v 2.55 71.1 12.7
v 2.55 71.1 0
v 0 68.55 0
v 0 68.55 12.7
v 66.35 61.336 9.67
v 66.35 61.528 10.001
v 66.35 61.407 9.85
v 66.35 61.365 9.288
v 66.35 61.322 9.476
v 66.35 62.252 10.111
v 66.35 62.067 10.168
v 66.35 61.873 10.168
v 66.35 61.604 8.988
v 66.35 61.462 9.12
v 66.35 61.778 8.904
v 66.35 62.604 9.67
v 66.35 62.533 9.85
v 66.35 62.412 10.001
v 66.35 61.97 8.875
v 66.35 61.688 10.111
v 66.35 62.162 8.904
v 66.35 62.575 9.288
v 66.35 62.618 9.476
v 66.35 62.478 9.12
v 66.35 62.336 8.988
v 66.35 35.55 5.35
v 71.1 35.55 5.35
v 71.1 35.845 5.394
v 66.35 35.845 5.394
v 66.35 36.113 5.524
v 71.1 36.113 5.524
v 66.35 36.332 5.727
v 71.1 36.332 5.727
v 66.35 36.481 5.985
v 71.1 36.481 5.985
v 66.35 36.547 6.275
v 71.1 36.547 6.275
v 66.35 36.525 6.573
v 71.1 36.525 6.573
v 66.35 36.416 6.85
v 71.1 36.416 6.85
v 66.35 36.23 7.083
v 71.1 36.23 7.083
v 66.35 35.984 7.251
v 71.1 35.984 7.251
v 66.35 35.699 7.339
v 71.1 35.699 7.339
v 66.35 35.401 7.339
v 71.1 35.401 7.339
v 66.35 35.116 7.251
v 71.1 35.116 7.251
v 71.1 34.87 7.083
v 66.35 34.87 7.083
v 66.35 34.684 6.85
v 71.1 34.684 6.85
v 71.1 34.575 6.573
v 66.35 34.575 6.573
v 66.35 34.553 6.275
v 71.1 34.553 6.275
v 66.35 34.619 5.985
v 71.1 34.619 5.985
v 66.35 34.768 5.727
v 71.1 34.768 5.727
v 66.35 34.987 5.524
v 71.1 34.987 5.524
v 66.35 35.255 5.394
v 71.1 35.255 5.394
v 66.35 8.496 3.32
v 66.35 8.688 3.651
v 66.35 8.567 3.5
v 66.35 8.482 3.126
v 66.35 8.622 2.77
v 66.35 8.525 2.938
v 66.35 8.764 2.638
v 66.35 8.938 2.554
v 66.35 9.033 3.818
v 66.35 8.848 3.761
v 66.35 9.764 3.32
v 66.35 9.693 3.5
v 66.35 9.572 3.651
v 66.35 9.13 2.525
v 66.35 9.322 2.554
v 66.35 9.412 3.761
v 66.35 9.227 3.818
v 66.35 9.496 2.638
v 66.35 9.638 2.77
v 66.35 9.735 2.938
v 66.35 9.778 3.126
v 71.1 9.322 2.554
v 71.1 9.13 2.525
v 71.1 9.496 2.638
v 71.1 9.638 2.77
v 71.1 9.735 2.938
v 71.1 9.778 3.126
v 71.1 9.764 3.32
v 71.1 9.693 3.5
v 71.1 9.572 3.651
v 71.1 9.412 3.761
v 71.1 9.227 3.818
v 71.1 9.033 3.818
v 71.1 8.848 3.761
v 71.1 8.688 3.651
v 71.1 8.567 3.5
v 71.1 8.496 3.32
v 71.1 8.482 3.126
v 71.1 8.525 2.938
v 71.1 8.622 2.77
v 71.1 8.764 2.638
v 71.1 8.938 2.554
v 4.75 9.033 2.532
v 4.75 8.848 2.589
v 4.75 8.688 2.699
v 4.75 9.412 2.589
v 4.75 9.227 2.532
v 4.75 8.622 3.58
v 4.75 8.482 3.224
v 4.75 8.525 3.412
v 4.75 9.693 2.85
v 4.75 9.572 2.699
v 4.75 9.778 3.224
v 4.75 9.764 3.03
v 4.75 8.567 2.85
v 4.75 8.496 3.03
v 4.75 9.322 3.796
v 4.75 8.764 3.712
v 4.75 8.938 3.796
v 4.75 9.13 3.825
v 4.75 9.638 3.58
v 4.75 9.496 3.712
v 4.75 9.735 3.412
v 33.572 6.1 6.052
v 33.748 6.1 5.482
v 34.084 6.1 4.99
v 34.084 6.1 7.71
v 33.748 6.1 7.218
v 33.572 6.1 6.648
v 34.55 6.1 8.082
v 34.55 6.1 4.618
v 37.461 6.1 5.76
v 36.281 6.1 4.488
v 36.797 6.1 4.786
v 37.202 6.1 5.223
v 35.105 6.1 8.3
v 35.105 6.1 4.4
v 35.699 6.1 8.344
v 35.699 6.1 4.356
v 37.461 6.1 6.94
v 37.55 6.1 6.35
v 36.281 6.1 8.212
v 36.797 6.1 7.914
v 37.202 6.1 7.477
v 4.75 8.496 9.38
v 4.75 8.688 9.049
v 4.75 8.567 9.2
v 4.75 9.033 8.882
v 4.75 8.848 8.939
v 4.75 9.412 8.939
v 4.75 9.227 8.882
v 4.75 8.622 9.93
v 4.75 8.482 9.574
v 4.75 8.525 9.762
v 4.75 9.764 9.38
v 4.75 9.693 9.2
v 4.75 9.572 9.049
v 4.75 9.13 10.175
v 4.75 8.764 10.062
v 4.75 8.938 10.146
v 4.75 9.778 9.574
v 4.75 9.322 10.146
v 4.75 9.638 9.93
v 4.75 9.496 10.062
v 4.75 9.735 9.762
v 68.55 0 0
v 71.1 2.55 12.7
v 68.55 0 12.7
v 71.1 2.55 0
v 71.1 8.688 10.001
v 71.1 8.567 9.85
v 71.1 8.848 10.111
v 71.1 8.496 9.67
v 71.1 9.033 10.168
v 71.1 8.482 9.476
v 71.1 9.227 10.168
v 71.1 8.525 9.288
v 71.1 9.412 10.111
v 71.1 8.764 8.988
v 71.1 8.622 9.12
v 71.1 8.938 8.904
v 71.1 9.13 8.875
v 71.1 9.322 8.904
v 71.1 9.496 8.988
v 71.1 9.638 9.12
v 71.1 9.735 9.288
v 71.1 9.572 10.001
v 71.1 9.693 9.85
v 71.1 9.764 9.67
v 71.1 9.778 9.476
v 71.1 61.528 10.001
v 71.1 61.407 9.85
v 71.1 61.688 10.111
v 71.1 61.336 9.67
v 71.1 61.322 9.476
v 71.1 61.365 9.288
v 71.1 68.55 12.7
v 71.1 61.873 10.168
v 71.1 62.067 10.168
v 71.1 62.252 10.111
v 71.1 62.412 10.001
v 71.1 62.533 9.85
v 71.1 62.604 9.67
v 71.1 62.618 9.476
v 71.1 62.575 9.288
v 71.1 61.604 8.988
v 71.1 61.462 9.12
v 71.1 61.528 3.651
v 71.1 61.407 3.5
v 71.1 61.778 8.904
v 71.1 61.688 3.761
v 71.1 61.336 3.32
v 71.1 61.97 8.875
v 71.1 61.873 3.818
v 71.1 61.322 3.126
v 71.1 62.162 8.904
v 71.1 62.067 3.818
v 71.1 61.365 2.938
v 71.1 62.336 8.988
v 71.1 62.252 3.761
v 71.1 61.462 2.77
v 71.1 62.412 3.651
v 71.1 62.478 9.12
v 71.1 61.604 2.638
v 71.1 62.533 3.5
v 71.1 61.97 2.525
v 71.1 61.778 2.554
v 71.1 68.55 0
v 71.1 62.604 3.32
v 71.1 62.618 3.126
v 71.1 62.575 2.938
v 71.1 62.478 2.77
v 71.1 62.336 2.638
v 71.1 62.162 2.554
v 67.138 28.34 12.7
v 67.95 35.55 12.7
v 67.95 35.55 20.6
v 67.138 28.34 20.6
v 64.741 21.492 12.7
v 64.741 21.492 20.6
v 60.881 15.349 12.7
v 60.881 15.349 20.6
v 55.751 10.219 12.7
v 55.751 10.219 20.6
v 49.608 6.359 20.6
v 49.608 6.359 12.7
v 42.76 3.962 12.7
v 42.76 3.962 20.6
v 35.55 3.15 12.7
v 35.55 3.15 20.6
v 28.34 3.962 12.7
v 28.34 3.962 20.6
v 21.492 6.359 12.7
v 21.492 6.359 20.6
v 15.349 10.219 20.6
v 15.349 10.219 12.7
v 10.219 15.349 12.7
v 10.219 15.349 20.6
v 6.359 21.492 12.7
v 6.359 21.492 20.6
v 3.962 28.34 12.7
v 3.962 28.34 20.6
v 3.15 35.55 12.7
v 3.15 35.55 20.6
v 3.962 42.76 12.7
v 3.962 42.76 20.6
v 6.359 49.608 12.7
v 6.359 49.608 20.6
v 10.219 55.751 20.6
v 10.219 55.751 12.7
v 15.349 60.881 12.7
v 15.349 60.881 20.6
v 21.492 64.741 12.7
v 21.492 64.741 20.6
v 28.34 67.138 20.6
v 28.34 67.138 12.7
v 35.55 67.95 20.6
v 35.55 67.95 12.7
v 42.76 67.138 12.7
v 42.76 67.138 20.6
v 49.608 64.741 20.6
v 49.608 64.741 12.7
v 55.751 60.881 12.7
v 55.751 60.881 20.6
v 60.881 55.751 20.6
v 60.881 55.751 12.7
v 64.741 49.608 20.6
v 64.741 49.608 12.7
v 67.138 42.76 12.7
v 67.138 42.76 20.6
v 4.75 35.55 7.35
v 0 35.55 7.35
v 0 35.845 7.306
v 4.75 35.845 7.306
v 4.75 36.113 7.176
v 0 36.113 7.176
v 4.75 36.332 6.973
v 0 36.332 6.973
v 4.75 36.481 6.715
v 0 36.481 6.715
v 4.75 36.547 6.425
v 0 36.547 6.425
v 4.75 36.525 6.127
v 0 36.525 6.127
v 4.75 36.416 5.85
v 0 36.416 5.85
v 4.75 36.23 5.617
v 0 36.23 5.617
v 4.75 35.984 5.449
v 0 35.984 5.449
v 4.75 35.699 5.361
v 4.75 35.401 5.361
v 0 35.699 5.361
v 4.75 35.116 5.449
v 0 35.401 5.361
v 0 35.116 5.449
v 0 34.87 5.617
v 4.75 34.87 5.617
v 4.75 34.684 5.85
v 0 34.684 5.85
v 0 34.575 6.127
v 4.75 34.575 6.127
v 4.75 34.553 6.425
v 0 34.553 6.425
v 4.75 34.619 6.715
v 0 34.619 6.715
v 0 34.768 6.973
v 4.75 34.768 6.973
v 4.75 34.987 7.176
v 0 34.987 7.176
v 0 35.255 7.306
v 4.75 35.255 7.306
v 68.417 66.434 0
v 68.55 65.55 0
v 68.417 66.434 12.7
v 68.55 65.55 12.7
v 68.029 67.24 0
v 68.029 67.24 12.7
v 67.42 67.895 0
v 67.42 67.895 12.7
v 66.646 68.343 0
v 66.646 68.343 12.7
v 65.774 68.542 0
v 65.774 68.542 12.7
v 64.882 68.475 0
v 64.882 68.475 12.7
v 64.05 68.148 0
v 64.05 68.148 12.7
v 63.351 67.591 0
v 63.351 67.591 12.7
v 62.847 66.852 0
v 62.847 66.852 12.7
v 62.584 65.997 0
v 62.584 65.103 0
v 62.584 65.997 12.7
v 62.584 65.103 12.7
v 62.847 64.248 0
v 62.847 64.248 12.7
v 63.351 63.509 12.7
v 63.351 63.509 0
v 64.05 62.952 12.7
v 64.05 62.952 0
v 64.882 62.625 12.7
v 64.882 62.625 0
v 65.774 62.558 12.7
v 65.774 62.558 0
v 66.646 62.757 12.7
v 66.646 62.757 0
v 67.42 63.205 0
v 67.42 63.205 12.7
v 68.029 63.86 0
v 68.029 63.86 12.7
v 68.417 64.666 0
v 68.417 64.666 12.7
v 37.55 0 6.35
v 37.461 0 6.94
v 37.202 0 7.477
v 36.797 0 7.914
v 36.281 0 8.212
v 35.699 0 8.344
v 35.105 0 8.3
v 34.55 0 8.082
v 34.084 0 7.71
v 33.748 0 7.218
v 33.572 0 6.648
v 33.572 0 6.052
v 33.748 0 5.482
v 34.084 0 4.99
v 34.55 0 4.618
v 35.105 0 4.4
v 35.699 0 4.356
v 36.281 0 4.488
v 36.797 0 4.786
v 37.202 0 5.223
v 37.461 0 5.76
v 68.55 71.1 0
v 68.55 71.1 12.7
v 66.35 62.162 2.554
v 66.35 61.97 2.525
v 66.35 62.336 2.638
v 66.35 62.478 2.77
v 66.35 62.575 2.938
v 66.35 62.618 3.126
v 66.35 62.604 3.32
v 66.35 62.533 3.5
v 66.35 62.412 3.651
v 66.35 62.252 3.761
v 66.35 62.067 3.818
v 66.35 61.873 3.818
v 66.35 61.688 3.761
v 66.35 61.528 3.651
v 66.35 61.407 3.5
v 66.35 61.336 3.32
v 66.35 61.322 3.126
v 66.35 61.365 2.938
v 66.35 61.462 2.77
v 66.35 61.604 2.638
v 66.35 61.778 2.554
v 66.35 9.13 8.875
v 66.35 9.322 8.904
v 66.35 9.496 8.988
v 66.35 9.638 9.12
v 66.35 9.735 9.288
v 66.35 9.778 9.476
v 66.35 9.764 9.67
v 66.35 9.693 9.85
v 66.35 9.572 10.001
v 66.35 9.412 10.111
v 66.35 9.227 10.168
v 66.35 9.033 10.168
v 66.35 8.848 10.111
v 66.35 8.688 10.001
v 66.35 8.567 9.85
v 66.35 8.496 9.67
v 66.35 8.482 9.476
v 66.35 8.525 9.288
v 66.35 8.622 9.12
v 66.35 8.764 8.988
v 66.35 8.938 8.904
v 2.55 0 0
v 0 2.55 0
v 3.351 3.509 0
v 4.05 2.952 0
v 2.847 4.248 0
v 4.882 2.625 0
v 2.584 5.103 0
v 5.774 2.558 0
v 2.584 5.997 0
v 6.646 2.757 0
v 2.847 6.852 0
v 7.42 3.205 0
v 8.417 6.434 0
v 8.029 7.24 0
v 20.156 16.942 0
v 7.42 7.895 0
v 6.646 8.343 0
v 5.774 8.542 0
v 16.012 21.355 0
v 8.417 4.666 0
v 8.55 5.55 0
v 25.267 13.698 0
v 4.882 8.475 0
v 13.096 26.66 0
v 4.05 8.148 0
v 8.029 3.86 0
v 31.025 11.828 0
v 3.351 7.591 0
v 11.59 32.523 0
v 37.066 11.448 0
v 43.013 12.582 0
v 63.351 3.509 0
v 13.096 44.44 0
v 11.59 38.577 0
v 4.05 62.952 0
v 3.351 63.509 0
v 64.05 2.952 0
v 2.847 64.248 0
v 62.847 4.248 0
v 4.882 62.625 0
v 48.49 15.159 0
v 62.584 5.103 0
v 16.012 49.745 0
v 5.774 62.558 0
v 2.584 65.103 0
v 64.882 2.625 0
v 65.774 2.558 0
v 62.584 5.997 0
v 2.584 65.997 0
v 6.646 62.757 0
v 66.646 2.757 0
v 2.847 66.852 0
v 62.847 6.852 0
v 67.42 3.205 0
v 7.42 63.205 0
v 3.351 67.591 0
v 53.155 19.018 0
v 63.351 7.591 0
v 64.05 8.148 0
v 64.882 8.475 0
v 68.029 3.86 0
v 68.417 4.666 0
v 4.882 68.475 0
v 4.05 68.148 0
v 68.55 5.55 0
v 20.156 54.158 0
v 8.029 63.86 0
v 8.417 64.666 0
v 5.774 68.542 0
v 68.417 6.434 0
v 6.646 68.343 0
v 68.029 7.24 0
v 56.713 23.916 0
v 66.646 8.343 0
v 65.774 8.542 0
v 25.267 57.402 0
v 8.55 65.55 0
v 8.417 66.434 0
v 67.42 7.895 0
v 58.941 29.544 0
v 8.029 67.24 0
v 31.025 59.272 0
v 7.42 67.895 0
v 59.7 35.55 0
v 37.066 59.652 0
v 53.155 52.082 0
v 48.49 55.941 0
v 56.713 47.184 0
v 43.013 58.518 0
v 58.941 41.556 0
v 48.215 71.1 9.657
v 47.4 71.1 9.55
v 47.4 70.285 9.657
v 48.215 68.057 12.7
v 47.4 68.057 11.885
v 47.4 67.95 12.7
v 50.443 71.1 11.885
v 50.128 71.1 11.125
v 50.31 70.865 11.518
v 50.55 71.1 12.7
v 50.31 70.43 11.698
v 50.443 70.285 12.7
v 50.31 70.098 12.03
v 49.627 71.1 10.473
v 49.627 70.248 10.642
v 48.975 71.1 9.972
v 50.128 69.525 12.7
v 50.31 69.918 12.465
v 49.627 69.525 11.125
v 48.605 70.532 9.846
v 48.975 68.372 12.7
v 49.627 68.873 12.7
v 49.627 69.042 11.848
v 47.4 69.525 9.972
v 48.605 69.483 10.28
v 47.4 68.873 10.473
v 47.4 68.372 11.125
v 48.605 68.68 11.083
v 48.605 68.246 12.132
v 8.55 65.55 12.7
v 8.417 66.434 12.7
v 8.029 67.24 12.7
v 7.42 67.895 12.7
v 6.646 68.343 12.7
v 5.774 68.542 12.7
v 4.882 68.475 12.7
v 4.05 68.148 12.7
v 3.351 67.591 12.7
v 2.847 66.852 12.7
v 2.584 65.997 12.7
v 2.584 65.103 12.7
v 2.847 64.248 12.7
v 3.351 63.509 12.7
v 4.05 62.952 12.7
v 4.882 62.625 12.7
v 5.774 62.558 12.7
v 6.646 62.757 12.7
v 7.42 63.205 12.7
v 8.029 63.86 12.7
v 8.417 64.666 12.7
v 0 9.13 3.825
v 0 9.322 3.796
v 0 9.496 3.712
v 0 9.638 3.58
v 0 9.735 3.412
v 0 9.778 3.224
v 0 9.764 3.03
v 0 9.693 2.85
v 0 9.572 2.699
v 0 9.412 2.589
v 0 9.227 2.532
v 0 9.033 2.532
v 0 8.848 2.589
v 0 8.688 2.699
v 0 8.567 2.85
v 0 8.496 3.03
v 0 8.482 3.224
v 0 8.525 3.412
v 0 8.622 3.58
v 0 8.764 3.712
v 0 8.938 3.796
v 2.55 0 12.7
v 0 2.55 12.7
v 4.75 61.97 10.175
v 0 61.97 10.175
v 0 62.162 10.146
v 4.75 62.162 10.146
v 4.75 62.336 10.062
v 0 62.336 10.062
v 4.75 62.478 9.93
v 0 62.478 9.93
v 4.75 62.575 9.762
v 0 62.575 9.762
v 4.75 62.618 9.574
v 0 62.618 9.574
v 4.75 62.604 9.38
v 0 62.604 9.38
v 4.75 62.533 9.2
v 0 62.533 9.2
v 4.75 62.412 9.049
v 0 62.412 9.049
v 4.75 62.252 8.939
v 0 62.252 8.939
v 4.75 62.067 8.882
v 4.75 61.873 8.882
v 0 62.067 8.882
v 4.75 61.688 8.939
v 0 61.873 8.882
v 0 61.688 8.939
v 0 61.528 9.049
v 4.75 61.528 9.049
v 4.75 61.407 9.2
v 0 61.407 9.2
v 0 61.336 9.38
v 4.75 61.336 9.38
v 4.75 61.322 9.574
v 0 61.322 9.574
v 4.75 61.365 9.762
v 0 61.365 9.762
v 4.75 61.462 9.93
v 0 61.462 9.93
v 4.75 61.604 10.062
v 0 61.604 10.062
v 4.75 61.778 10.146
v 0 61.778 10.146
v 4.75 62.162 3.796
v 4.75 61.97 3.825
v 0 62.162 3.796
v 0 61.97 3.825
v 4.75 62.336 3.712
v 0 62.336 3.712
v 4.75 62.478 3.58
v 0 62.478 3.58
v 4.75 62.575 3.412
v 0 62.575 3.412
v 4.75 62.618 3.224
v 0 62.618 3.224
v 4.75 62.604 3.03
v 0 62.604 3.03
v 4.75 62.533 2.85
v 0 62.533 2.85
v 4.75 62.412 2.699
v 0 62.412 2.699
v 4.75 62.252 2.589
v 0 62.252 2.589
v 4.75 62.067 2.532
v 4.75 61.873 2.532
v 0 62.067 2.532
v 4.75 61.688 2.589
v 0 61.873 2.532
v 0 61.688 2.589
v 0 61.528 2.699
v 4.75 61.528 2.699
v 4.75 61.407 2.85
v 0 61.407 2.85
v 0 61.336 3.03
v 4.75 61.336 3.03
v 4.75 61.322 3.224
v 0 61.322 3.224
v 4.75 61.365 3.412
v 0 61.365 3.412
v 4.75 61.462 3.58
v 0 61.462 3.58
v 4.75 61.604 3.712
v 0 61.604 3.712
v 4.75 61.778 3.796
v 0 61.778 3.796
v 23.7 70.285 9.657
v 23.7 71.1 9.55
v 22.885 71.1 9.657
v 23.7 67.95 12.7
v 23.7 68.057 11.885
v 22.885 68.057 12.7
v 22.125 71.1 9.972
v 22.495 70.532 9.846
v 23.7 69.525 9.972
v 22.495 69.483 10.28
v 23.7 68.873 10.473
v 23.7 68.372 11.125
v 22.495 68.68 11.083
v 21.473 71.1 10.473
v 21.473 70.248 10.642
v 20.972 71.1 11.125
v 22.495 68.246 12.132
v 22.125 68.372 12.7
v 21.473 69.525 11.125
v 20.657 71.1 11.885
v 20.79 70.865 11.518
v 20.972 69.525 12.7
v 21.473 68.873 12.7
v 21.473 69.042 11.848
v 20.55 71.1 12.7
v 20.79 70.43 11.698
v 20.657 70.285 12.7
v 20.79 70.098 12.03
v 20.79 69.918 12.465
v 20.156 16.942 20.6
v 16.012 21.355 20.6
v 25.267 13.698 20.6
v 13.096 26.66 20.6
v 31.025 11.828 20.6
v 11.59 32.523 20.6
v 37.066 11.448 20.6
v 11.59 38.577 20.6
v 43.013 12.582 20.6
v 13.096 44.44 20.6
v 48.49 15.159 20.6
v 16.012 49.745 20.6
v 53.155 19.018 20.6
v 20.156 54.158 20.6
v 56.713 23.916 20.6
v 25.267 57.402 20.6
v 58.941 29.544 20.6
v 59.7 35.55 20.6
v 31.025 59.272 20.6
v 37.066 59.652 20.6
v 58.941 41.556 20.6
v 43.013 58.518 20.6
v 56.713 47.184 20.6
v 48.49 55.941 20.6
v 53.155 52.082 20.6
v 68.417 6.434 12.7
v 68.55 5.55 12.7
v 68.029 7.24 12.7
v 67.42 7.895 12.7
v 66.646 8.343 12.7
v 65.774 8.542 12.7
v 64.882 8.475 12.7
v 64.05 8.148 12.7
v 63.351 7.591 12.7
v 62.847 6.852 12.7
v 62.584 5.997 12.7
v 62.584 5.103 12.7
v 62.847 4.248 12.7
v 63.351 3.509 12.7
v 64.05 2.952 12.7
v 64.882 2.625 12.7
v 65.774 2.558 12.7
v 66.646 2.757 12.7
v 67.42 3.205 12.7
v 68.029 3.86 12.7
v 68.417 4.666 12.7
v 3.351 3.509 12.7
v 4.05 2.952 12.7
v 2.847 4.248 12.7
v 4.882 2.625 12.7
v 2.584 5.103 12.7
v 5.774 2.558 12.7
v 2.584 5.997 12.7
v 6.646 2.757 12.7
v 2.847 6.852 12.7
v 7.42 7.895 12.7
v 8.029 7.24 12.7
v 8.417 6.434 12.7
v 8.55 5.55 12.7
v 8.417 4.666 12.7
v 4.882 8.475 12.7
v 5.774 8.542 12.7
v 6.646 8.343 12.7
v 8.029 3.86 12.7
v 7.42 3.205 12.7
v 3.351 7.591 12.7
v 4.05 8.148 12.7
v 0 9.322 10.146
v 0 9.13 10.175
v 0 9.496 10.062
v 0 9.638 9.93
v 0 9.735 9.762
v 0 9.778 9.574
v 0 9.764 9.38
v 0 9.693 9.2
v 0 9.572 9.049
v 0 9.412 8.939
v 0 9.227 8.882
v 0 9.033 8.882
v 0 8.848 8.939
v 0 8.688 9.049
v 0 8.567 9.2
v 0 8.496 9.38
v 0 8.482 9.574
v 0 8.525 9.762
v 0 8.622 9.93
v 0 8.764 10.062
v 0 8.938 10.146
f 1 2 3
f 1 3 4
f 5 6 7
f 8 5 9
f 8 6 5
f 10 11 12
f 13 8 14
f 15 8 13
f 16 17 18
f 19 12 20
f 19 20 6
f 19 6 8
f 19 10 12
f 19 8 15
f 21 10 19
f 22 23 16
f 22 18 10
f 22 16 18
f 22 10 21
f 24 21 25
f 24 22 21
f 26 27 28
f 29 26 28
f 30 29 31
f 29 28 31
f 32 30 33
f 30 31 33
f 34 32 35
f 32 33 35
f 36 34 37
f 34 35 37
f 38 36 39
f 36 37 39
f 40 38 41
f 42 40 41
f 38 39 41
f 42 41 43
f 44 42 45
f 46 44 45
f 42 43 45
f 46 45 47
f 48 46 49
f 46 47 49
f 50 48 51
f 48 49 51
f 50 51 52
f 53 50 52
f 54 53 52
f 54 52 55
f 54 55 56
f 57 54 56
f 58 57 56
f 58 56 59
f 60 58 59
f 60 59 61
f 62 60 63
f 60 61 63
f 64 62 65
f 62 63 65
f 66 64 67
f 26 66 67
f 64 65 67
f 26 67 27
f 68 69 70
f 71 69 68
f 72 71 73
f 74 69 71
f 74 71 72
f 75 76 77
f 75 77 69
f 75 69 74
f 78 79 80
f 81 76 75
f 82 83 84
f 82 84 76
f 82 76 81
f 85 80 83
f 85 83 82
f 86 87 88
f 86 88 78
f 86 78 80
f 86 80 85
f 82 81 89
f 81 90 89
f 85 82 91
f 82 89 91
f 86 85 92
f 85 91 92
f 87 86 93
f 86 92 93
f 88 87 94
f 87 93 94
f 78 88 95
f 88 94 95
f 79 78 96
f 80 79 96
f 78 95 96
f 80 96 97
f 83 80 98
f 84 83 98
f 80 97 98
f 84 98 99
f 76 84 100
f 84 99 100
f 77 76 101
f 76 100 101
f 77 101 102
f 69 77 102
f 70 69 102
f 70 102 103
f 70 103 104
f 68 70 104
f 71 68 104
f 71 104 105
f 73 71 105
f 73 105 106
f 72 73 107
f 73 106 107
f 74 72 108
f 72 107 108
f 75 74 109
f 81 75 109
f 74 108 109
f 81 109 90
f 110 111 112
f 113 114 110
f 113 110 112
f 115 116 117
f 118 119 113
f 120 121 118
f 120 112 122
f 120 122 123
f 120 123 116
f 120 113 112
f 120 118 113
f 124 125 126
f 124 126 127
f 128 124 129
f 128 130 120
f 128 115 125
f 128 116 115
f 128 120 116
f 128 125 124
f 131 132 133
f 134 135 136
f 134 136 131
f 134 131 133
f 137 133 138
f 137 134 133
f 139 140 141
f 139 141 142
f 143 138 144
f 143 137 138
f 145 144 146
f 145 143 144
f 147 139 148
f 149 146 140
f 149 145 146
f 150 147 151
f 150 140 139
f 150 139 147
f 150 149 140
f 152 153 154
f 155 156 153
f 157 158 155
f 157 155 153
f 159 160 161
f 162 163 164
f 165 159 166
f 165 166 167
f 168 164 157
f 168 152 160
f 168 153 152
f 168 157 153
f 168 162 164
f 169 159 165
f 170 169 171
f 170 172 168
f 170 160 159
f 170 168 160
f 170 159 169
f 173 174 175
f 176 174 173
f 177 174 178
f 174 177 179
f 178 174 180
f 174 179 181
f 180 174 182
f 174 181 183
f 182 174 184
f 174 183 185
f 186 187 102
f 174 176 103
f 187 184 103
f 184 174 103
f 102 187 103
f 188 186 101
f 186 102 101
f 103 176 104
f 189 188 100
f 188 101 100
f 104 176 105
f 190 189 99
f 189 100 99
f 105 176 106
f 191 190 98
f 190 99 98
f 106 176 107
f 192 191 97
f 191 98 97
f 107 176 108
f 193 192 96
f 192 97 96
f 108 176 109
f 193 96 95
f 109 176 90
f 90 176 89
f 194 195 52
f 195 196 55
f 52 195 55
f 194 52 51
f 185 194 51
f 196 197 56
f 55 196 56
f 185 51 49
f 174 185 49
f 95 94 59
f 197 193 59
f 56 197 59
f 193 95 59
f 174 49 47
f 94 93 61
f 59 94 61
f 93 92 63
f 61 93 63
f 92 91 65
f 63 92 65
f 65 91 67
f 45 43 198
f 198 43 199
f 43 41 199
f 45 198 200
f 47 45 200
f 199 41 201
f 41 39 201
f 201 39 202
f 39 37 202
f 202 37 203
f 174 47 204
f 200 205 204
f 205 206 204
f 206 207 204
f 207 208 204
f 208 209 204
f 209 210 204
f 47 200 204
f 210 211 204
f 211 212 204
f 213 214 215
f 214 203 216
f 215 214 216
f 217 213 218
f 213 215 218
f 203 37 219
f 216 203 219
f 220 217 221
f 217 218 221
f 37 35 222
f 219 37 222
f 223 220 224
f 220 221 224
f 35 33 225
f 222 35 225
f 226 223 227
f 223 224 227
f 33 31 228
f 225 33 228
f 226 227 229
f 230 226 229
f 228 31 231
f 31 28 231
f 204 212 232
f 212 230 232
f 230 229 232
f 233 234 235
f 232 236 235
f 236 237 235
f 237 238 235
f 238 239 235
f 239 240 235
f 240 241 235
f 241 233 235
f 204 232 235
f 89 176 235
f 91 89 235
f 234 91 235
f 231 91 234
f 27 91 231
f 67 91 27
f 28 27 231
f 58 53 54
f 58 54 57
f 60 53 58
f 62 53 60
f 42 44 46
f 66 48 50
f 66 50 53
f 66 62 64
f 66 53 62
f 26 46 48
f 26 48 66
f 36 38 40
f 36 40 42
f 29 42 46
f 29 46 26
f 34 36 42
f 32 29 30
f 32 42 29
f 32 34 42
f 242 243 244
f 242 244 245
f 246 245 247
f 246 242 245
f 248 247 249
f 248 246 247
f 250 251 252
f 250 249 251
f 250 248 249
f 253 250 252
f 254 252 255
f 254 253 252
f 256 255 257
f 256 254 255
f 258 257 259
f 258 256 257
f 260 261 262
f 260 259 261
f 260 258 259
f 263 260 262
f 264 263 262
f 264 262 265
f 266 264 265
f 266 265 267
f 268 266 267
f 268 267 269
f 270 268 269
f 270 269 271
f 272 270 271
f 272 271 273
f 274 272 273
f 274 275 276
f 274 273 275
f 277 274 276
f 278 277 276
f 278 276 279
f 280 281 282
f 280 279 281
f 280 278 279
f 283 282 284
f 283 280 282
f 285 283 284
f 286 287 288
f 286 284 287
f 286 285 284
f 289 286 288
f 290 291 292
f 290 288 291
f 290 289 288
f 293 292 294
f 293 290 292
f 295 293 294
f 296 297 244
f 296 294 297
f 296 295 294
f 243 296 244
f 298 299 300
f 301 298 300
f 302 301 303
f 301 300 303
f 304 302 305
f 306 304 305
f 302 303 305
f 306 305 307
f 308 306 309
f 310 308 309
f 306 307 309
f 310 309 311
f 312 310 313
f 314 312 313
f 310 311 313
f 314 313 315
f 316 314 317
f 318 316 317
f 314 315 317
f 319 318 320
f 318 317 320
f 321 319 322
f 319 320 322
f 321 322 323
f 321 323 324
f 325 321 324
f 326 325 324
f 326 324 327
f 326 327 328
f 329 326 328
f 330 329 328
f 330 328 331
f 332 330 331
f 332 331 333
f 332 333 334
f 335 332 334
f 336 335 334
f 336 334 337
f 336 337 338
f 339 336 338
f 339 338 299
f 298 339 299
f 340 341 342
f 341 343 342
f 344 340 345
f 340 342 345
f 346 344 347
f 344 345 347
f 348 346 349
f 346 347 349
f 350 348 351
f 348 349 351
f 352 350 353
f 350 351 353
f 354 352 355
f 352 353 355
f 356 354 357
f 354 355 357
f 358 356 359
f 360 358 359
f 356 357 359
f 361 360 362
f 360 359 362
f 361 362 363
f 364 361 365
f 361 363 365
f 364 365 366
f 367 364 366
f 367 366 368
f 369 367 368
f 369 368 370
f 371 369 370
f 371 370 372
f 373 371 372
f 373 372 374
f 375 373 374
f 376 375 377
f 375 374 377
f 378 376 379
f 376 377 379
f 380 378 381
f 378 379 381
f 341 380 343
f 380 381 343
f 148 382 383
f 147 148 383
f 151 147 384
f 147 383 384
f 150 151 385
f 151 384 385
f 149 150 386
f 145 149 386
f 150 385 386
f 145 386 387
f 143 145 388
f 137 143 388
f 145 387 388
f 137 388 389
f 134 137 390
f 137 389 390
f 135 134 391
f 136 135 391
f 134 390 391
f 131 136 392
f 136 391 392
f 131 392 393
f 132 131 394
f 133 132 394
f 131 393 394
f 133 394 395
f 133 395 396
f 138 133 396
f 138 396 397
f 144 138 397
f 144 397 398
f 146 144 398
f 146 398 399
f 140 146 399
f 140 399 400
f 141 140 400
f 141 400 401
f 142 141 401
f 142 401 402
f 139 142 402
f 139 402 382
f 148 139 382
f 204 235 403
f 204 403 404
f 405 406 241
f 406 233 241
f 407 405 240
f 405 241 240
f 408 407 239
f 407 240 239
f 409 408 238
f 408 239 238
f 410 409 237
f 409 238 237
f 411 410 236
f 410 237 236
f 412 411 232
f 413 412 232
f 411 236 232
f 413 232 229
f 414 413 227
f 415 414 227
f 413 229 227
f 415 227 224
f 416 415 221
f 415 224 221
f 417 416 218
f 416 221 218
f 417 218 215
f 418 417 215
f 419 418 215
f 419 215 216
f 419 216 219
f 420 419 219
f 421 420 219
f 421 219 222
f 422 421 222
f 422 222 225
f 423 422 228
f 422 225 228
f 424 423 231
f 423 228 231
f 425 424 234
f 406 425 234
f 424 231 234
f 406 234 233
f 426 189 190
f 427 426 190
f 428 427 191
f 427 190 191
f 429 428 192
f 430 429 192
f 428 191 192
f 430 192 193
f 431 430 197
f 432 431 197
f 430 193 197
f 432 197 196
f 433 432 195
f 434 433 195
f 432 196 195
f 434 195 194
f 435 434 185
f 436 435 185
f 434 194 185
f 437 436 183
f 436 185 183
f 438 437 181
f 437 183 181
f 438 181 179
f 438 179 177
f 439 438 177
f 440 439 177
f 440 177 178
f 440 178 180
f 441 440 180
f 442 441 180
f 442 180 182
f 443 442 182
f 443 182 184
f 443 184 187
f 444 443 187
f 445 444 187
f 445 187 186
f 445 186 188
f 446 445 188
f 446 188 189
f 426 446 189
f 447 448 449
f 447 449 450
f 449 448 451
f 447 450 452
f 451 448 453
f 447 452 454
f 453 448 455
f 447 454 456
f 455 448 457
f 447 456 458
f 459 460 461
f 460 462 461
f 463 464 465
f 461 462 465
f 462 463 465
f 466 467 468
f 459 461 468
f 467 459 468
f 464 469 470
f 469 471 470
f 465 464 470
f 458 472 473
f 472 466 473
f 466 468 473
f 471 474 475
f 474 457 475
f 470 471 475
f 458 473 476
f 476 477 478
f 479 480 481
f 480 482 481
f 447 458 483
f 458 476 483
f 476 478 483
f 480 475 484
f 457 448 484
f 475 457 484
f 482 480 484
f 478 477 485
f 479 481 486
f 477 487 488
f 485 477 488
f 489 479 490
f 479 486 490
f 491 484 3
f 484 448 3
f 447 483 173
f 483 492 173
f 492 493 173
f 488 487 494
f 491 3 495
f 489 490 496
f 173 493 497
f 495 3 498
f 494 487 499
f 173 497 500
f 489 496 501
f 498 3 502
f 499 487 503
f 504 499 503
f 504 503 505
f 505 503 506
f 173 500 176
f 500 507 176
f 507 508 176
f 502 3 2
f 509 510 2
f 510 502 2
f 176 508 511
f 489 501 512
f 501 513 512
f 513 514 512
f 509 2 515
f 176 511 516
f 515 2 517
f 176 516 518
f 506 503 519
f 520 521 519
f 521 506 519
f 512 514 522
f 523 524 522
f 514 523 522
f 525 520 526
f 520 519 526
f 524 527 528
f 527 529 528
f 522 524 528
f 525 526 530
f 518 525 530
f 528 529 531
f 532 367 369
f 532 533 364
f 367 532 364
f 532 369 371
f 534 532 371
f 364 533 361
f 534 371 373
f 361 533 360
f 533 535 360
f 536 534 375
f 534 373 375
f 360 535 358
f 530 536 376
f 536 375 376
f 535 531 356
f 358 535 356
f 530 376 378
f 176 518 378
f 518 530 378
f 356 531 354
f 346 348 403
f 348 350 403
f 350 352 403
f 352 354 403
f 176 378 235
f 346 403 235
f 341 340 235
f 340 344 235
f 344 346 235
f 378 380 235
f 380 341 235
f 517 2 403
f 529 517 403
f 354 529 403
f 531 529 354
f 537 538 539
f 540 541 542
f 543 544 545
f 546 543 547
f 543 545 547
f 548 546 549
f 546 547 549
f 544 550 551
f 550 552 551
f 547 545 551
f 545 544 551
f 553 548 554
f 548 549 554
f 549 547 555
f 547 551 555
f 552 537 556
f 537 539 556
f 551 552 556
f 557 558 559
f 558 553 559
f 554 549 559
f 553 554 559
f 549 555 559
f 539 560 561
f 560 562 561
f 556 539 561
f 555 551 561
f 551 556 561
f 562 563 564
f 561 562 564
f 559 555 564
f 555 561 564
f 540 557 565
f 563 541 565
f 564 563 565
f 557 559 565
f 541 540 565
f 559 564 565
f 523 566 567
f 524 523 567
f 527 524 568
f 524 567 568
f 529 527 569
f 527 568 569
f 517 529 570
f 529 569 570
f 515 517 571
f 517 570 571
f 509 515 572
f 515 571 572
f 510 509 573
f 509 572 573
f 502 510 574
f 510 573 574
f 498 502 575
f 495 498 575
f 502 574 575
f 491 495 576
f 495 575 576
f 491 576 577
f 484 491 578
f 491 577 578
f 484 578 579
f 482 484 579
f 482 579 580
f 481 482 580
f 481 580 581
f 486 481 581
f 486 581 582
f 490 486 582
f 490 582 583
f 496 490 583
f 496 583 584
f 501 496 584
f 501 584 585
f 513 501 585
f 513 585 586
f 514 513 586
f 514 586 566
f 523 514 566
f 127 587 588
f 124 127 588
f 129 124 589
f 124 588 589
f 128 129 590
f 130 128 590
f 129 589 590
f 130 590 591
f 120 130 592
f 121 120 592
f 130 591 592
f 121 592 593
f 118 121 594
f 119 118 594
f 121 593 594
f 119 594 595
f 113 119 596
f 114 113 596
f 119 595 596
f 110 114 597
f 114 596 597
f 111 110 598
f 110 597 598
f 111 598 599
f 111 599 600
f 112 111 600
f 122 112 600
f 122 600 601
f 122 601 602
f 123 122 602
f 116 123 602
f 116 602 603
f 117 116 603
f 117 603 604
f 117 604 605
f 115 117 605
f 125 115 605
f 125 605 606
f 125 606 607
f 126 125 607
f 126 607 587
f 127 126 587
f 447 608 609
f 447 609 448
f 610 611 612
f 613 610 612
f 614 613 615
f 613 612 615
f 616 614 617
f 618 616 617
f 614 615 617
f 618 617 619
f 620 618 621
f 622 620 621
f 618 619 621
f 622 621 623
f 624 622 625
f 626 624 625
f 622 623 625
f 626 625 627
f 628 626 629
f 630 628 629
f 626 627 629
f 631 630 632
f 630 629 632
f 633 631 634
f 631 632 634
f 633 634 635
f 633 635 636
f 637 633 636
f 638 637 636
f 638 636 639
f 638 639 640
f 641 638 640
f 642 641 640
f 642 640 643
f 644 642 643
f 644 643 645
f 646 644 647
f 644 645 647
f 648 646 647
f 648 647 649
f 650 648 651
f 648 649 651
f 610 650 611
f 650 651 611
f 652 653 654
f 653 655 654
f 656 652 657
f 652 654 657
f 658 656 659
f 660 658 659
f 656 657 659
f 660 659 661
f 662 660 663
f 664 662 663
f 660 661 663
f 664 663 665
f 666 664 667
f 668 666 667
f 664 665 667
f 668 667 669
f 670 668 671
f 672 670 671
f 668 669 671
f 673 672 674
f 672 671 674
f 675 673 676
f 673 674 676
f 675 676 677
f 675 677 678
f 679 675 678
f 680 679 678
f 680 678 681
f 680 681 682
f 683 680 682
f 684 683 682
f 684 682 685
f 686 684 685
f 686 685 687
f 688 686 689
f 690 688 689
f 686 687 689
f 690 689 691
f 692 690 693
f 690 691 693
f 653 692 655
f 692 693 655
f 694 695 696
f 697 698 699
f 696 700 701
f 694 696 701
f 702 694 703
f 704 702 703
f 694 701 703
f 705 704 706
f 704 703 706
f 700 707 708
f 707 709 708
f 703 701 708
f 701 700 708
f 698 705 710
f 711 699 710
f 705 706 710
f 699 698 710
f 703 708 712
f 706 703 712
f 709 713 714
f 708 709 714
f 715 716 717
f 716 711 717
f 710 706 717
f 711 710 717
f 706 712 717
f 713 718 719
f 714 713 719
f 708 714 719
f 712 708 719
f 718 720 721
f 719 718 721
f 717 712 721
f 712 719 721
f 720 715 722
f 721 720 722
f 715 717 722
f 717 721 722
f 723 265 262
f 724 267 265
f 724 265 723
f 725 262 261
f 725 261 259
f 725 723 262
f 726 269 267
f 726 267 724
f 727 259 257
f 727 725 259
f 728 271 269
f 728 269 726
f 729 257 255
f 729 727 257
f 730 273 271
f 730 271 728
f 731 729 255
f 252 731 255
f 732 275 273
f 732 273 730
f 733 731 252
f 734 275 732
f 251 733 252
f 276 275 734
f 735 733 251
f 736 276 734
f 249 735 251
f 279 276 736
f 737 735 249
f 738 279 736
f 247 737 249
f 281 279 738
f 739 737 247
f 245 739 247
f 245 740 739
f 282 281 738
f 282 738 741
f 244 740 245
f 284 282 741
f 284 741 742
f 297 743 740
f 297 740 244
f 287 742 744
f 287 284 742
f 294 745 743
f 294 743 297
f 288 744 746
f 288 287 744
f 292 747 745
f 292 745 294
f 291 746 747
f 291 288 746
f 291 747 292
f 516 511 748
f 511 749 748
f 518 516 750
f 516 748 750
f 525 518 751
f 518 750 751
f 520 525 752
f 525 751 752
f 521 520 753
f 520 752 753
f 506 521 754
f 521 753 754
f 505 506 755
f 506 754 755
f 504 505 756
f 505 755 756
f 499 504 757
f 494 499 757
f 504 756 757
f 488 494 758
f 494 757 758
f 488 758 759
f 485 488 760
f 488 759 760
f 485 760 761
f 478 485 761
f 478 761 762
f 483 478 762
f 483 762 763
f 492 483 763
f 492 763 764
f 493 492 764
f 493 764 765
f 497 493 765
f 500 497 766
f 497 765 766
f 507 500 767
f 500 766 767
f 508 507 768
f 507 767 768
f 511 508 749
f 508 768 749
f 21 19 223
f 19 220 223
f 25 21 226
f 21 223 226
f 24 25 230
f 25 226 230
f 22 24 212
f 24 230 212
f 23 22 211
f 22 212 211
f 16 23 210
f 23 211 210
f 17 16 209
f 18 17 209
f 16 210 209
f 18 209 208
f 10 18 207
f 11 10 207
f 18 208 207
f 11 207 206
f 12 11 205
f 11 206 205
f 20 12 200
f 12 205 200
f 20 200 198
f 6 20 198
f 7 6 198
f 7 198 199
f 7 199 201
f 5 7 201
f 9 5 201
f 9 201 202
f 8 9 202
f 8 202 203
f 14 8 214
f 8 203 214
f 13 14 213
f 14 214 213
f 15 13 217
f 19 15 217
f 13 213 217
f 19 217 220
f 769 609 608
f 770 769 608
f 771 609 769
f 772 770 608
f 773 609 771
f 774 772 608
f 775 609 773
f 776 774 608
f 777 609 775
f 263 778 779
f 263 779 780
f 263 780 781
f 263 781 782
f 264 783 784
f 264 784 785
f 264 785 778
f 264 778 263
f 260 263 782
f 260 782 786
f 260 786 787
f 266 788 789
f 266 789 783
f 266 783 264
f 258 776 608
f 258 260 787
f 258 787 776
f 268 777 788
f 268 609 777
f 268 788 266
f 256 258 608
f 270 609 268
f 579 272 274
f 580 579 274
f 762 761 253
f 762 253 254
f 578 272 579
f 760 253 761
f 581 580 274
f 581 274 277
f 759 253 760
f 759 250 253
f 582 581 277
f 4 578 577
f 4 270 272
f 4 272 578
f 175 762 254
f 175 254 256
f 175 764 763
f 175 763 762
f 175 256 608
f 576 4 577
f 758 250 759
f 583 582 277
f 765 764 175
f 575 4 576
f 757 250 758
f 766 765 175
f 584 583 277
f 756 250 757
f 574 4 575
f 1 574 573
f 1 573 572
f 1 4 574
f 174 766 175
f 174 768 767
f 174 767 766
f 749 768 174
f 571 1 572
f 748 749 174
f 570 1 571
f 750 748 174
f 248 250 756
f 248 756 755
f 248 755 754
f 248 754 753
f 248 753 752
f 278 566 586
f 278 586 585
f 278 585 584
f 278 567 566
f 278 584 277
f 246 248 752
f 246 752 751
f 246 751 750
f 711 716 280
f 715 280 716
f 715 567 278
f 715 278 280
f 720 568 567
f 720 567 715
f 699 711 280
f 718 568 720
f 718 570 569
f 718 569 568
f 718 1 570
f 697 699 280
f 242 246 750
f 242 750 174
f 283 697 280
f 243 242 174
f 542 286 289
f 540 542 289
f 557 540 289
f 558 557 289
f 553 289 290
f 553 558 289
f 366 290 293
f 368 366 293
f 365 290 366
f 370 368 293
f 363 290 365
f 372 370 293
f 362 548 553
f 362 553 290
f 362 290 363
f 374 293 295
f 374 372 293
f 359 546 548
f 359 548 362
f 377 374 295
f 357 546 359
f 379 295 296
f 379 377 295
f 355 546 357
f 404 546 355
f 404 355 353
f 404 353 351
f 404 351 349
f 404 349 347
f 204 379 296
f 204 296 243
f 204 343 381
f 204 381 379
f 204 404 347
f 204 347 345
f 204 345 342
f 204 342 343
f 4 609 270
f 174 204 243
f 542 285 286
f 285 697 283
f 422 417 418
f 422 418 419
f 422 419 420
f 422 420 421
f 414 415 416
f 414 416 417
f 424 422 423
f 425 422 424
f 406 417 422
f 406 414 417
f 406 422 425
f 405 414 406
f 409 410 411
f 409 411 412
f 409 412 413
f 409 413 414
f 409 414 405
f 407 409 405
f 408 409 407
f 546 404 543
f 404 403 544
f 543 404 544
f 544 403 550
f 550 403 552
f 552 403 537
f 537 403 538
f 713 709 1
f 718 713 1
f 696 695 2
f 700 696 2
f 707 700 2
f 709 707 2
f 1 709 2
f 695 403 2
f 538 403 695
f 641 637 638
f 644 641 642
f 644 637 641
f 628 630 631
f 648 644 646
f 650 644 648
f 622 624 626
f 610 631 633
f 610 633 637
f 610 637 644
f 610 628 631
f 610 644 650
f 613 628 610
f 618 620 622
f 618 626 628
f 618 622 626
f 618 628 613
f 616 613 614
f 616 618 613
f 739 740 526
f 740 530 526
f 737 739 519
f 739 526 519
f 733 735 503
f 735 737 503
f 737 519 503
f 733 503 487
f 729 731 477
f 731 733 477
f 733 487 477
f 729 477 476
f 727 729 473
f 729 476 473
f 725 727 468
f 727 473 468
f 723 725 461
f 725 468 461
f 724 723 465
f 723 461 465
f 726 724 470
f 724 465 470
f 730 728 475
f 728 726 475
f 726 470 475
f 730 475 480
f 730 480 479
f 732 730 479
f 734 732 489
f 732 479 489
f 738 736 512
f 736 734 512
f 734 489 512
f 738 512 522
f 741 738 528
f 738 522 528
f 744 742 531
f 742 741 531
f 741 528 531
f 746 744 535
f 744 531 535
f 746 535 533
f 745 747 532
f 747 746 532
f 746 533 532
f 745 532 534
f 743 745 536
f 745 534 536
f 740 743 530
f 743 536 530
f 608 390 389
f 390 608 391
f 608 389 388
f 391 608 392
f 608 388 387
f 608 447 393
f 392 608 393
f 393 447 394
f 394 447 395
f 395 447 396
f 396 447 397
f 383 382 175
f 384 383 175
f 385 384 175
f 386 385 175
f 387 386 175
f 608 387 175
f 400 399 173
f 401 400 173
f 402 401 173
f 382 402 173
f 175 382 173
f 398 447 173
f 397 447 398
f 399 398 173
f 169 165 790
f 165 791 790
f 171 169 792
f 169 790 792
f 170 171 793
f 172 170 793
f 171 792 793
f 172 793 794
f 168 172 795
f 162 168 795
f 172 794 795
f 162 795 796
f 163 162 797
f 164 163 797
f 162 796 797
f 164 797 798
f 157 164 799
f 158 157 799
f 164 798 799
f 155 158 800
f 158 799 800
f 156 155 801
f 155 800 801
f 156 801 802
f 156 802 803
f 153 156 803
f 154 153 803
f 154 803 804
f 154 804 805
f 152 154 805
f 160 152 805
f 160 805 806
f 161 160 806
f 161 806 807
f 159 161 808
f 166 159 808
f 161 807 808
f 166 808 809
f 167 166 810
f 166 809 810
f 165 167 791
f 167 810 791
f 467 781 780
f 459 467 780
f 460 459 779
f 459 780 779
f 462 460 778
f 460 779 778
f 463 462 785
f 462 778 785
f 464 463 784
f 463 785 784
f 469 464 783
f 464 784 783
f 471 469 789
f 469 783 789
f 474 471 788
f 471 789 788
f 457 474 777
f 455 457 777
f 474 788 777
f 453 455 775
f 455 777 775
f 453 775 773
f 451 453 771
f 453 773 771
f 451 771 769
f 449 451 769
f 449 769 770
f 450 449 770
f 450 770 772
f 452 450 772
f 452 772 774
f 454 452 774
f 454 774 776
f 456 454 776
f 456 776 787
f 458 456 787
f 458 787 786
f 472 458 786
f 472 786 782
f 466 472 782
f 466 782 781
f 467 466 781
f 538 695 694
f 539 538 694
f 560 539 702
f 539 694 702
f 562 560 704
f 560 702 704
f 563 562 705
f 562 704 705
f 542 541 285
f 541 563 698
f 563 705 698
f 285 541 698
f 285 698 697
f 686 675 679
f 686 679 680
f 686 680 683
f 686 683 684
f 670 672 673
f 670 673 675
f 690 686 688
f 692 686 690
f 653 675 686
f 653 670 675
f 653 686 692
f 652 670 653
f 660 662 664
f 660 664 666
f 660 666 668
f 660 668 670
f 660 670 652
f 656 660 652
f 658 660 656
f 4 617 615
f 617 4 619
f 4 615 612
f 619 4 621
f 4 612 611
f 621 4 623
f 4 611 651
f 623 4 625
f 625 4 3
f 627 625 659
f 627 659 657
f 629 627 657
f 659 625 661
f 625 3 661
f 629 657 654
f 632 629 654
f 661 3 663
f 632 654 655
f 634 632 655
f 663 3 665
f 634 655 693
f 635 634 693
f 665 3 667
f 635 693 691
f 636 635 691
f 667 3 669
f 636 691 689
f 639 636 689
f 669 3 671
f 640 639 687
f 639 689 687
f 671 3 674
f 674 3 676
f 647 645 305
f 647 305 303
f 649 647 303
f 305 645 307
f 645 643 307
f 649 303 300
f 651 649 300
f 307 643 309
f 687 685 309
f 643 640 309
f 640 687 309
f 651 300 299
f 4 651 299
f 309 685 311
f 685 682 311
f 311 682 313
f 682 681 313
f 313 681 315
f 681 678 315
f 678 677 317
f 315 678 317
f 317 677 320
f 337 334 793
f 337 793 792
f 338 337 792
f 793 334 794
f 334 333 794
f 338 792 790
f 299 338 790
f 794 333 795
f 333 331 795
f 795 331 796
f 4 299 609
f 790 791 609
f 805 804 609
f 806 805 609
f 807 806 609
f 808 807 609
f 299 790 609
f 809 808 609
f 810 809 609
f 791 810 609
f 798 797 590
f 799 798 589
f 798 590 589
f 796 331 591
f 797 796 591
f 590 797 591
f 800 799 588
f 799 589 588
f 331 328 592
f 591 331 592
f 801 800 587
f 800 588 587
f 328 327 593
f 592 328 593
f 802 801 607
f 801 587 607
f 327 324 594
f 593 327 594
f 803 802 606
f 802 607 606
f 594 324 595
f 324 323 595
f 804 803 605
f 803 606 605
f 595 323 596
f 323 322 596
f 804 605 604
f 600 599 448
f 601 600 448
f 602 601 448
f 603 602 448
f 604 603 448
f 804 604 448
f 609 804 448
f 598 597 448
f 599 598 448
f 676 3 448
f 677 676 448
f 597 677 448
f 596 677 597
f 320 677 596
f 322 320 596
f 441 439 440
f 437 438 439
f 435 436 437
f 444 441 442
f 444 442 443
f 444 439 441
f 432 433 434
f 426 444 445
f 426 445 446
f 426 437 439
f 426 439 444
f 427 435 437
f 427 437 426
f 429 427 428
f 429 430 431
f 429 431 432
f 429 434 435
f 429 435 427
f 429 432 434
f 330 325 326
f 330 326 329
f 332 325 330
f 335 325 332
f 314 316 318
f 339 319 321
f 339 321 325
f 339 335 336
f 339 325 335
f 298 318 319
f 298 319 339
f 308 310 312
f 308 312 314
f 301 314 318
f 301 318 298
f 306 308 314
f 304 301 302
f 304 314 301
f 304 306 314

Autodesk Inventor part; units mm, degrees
ref_plane "YZ Plane" through (0, 0, 0) normal (1, 0, 0) x (0, 1, 0)
ref_plane "XZ Plane" through (0, 0, 0) normal (0, 1, 0) x (-1, 0, 0)
ref_plane "XY Plane" through (0, 0, 0) normal (0, 0, 1) x (1, 0, 0)
sketch "Sketch1" plane through (0, 0, 0) normal (0, 0, 1) x (1, 0, 0)
  line L0 (0, 0) -> (71.1, 0)
  line L1 (71.1, 0) -> (71.1, 71.1)
  line L2 (71.1, 71.1) -> (0, 71.1)
  line L3 (0, 71.1) -> (0, 0)
  circle A0 centre (35.55, 35.55) radius 24.15
  dimension "d0" = 71.1
  dimension "d1" = 71.1
  dimension "d2" = 48.3
extrude "Extrusion1" add sketch "Sketch1" along normal blind 12.7
sketch "Sketch2" plane through (0, 0, 12.7) normal (0, 0, 1) x (1, 0, 0)
  line L0 (71.1, 71.1) -> (0, 71.1) projected
  line L1 (0, 71.1) -> (0, 0) projected
  line L2 (0, 0) -> (71.1, 0) projected
  line L3 (71.1, 0) -> (71.1, 71.1) projected
  circle A0 centre (35.55, 35.55) radius 24.15 projected
  circle A1 centre (35.55, 35.55) radius 24.15
  circle A2 centre (35.55, 35.55) radius 32.4
  dimension "d5" = 64.8
extrude "Extrusion2" add sketch "Sketch2" along normal blind 7.9 contours A2
sketch "Sketch3" plane through (0, 71.1, 0) normal (0, 1, 0) x (1, 0, 0)
  line L0 (71.1, 0) -> (0, 0) projected
  line L1 (0, 0) -> (0, -12.7) projected
  line L2 (71.1, -12.7) -> (0, -12.7) projected
  line L3 (71.1, 0) -> (71.1, -12.7) projected
  line L4 (71.1, 0) -> (71.1, -12.7) projected
  line L5 (71.1, -12.7) -> (35.55, -12.7)
  line L6 (0, -12.7) -> (71.1, -12.7) projected
  line L7 (35.55, -12.7) -> (20.55, -12.7)
  line L8 (20.55, -12.7) -> (23.7, -12.7)
  arc A0 (23.7, -9.55) -> (20.55, -12.7) centre (23.7, -12.7) ccw
  line L9 (35.55, -12.7) -> (47.4, -12.7)
  arc A1 (50.55, -12.7) -> (47.4, -9.55) centre (47.4, -12.7) ccw
  line L10 (47.4, -9.55) -> (23.7, -9.55)
  dimension "d8" = 35.55
  dimension "d9" = 15
  dimension "d10" = 3.15
  dimension "d11" = 11.85
  dimension "d12" = 6.3
revolve "Revolution1" cut sketch "Sketch3" angle 360 about axis through (71.1, 71.1, 12.7) along (-1, 0, 0) contours L2 A0 L10 A1
sketch "Sketch4" plane through (0, 0, 12.7) normal (0, 0, 1) x (1, 0, 0)
  arc A0 (20.55, 71.1) -> (23.7, 67.95) centre (23.7, 71.1) ccw projected
  line L0 (20.55, 71.1) -> (0, 71.1) projected
  line L1 (0, 71.1) -> (0, 0) projected
  line L2 (0, 0) -> (71.1, 0) projected
  line L3 (71.1, 0) -> (71.1, 71.1) projected
  line L4 (71.1, 71.1) -> (50.55, 71.1) projected
  arc A1 (47.4, 67.95) -> (50.55, 71.1) centre (47.4, 71.1) ccw projected
  line L5 (47.4, 67.95) -> (35.55, 67.95) projected
  circle A2 centre (35.55, 35.55) radius 32.4 projected
  line L6 (35.55, 67.95) -> (23.7, 67.95) projected
  line L7 (35.55, 35.55) -> (65.55, 35.55)
  line L8 (65.55, 35.55) -> (65.55, 65.55)
  line L9 (65.55, 65.55) -> (5.55, 65.55)
  line L10 (5.55, 65.55) -> (5.55, 5.55)
  line L11 (5.55, 5.55) -> (65.55, 5.55)
  circle A3 centre (65.55, 65.55) radius 3
  circle A4 centre (5.55, 65.55) radius 3
  circle A5 centre (5.55, 5.55) radius 3
  circle A6 centre (65.55, 5.55) radius 3
  dimension "d14" = 30
  dimension "d15" = 30
  dimension "d16" = 60
  dimension "d17" = 60
  dimension "d18" = 60
  dimension "d19" = 6
  dimension "d20" = 6
  dimension "d21" = 6
  dimension "d22" = 6
extrude "Extrusion3" cut sketch "Sketch4" against normal blind 12.7 contours A6 | A3 L8 L9 | L9 L8 A3 | A4 L10 L9 | L9 L10 A4 | A5 L11 L10 | L10 L11 A5
sketch "Sketch5" plane through (71.1, 0, 0) normal (1, 0, 0) x (0, 0, -1)
  line L0 (0, 0) -> (0, 71.1) projected
  line L1 (0, 71.1) -> (-12.7, 71.1) projected
  line L2 (-12.7, 0) -> (-12.7, 71.1) projected
  line L3 (0, 0) -> (-12.7, 0) projected
  line L4 (-12.7, 71.1) -> (-12.7, 0) projected
  line L5 (-12.7, 35.55) -> (-6.35, 35.55)
  circle A0 centre (-6.35, 35.55) radius 1
  line L6 (-6.35, 35.55) -> (-9.525, 35.55)
  line L7 (-9.525, 35.55) -> (-9.525, 65.55)
  line L8 (-9.525, 65.55) -> (-9.525, 61.97)
  line L9 (-9.525, 65.55) -> (-3.175, 65.55)
  line L10 (-3.175, 65.55) -> (-3.175, 5.55)
  line L11 (-3.175, 5.55) -> (-3.175, 9.13)
  line L12 (-3.175, 9.13) -> (-9.525, 9.13)
  circle A1 centre (-9.525, 9.13) radius 0.65
  circle A2 centre (-3.175, 9.13) radius 0.65
  circle A3 centre (-9.525, 61.97) radius 0.65
  circle A4 centre (-3.175, 61.97) radius 0.65
  line L13 (-9.525, 61.97) -> (-3.175, 61.97)
  dimension "d25" = 6.35
  dimension "d26" = 2
  dimension "d37" = 3.175
  dimension "d38" = 30
  dimension "d39" = 3.58
  dimension "d40" = 6.35
  dimension "d41" = 60
  dimension "d42" = 3.58
  dimension "d43" = 6.35
  dimension "d44" = 1.3
  dimension "d45" = 1.3
  dimension "d46" = 1.3
  dimension "d47" = 1.3
  dimension "d48" = 6.35
extrude "Extrusion4" cut sketch "Sketch5" against normal blind 4.75 contours A1 | A2 L10 | L10 L12 A2 | A3 L7 | L7 L13 A3 | A0 | L7 A3 L13 | L13 L10 A4 | A4 L10 L13 | A4 L10 | L10 A2 L12
sketch "Sketch6" plane through (0, 0, 0) normal (0, -1, 0) x (1, 0, 0)
  line L0 (0, 0) -> (71.1, 0) projected
  line L1 (71.1, 0) -> (71.1, 12.7) projected
  line L2 (0, 12.7) -> (71.1, 12.7) projected
  line L3 (0, 0) -> (0, 12.7) projected
  circle A0 centre (35.55, 6.35) radius 2
  dimension "d29" = 4
extrude "Extrusion5" cut sketch "Sketch6" against normal blind 6.1 contours A0
thread "Thread1" size "M4x0.7" class "6H" standard "ANSI Metric M Profile" full length
chamfer "Chamfer1" distance 2.55 angle 45 4 edges at (71.1, 71.1, 6.35) (71.1, 0, 6.35) (0, 71.1, 6.35) (0, 0, 6.35)
sketch "Sketch7" plane through (0, 2.55, 0) normal (-1, 0, 0) x (0, 0, 1)
  circle A0 centre (9.525, 6.58) radius 0.65 projected
  circle A1 centre (3.175, 6.58) radius 0.65 projected
  circle A2 centre (3.175, 59.42) radius 0.65 projected
  circle A3 centre (6.35, 33) radius 1 projected
  circle A4 centre (9.525, 59.42) radius 0.65 projected
  line L0 (0, 0) -> (12.7, 0) projected
  line L1 (0, 0) -> (0, 66) projected
  line L2 (12.7, 66) -> (0, 66) projected
  line L3 (12.7, 0) -> (12.7, 66) projected
  circle A5 centre (3.175, 59.42) radius 0.65
  circle A6 centre (9.525, 59.42) radius 0.65
  circle A7 centre (6.35, 33) radius 1
  circle A8 centre (3.175, 6.58) radius 0.65 projected
  circle A9 centre (3.175, 6.58) radius 0.65
  circle A10 centre (9.525, 6.58) radius 0.65
  point P0 (0, -2.55)
  dimension "d49" = 1.3
  dimension "d50" = 1.3
  dimension "d51" = 2
  dimension "d52" = 1.3
  dimension "d53" = 1.3
extrude "Extrusion6" cut sketch "Sketch7" against normal blind 4.75 contours A0 | A1 | A2 | A3 | A4
properties part number "0x001" material "Iron, Cast"
